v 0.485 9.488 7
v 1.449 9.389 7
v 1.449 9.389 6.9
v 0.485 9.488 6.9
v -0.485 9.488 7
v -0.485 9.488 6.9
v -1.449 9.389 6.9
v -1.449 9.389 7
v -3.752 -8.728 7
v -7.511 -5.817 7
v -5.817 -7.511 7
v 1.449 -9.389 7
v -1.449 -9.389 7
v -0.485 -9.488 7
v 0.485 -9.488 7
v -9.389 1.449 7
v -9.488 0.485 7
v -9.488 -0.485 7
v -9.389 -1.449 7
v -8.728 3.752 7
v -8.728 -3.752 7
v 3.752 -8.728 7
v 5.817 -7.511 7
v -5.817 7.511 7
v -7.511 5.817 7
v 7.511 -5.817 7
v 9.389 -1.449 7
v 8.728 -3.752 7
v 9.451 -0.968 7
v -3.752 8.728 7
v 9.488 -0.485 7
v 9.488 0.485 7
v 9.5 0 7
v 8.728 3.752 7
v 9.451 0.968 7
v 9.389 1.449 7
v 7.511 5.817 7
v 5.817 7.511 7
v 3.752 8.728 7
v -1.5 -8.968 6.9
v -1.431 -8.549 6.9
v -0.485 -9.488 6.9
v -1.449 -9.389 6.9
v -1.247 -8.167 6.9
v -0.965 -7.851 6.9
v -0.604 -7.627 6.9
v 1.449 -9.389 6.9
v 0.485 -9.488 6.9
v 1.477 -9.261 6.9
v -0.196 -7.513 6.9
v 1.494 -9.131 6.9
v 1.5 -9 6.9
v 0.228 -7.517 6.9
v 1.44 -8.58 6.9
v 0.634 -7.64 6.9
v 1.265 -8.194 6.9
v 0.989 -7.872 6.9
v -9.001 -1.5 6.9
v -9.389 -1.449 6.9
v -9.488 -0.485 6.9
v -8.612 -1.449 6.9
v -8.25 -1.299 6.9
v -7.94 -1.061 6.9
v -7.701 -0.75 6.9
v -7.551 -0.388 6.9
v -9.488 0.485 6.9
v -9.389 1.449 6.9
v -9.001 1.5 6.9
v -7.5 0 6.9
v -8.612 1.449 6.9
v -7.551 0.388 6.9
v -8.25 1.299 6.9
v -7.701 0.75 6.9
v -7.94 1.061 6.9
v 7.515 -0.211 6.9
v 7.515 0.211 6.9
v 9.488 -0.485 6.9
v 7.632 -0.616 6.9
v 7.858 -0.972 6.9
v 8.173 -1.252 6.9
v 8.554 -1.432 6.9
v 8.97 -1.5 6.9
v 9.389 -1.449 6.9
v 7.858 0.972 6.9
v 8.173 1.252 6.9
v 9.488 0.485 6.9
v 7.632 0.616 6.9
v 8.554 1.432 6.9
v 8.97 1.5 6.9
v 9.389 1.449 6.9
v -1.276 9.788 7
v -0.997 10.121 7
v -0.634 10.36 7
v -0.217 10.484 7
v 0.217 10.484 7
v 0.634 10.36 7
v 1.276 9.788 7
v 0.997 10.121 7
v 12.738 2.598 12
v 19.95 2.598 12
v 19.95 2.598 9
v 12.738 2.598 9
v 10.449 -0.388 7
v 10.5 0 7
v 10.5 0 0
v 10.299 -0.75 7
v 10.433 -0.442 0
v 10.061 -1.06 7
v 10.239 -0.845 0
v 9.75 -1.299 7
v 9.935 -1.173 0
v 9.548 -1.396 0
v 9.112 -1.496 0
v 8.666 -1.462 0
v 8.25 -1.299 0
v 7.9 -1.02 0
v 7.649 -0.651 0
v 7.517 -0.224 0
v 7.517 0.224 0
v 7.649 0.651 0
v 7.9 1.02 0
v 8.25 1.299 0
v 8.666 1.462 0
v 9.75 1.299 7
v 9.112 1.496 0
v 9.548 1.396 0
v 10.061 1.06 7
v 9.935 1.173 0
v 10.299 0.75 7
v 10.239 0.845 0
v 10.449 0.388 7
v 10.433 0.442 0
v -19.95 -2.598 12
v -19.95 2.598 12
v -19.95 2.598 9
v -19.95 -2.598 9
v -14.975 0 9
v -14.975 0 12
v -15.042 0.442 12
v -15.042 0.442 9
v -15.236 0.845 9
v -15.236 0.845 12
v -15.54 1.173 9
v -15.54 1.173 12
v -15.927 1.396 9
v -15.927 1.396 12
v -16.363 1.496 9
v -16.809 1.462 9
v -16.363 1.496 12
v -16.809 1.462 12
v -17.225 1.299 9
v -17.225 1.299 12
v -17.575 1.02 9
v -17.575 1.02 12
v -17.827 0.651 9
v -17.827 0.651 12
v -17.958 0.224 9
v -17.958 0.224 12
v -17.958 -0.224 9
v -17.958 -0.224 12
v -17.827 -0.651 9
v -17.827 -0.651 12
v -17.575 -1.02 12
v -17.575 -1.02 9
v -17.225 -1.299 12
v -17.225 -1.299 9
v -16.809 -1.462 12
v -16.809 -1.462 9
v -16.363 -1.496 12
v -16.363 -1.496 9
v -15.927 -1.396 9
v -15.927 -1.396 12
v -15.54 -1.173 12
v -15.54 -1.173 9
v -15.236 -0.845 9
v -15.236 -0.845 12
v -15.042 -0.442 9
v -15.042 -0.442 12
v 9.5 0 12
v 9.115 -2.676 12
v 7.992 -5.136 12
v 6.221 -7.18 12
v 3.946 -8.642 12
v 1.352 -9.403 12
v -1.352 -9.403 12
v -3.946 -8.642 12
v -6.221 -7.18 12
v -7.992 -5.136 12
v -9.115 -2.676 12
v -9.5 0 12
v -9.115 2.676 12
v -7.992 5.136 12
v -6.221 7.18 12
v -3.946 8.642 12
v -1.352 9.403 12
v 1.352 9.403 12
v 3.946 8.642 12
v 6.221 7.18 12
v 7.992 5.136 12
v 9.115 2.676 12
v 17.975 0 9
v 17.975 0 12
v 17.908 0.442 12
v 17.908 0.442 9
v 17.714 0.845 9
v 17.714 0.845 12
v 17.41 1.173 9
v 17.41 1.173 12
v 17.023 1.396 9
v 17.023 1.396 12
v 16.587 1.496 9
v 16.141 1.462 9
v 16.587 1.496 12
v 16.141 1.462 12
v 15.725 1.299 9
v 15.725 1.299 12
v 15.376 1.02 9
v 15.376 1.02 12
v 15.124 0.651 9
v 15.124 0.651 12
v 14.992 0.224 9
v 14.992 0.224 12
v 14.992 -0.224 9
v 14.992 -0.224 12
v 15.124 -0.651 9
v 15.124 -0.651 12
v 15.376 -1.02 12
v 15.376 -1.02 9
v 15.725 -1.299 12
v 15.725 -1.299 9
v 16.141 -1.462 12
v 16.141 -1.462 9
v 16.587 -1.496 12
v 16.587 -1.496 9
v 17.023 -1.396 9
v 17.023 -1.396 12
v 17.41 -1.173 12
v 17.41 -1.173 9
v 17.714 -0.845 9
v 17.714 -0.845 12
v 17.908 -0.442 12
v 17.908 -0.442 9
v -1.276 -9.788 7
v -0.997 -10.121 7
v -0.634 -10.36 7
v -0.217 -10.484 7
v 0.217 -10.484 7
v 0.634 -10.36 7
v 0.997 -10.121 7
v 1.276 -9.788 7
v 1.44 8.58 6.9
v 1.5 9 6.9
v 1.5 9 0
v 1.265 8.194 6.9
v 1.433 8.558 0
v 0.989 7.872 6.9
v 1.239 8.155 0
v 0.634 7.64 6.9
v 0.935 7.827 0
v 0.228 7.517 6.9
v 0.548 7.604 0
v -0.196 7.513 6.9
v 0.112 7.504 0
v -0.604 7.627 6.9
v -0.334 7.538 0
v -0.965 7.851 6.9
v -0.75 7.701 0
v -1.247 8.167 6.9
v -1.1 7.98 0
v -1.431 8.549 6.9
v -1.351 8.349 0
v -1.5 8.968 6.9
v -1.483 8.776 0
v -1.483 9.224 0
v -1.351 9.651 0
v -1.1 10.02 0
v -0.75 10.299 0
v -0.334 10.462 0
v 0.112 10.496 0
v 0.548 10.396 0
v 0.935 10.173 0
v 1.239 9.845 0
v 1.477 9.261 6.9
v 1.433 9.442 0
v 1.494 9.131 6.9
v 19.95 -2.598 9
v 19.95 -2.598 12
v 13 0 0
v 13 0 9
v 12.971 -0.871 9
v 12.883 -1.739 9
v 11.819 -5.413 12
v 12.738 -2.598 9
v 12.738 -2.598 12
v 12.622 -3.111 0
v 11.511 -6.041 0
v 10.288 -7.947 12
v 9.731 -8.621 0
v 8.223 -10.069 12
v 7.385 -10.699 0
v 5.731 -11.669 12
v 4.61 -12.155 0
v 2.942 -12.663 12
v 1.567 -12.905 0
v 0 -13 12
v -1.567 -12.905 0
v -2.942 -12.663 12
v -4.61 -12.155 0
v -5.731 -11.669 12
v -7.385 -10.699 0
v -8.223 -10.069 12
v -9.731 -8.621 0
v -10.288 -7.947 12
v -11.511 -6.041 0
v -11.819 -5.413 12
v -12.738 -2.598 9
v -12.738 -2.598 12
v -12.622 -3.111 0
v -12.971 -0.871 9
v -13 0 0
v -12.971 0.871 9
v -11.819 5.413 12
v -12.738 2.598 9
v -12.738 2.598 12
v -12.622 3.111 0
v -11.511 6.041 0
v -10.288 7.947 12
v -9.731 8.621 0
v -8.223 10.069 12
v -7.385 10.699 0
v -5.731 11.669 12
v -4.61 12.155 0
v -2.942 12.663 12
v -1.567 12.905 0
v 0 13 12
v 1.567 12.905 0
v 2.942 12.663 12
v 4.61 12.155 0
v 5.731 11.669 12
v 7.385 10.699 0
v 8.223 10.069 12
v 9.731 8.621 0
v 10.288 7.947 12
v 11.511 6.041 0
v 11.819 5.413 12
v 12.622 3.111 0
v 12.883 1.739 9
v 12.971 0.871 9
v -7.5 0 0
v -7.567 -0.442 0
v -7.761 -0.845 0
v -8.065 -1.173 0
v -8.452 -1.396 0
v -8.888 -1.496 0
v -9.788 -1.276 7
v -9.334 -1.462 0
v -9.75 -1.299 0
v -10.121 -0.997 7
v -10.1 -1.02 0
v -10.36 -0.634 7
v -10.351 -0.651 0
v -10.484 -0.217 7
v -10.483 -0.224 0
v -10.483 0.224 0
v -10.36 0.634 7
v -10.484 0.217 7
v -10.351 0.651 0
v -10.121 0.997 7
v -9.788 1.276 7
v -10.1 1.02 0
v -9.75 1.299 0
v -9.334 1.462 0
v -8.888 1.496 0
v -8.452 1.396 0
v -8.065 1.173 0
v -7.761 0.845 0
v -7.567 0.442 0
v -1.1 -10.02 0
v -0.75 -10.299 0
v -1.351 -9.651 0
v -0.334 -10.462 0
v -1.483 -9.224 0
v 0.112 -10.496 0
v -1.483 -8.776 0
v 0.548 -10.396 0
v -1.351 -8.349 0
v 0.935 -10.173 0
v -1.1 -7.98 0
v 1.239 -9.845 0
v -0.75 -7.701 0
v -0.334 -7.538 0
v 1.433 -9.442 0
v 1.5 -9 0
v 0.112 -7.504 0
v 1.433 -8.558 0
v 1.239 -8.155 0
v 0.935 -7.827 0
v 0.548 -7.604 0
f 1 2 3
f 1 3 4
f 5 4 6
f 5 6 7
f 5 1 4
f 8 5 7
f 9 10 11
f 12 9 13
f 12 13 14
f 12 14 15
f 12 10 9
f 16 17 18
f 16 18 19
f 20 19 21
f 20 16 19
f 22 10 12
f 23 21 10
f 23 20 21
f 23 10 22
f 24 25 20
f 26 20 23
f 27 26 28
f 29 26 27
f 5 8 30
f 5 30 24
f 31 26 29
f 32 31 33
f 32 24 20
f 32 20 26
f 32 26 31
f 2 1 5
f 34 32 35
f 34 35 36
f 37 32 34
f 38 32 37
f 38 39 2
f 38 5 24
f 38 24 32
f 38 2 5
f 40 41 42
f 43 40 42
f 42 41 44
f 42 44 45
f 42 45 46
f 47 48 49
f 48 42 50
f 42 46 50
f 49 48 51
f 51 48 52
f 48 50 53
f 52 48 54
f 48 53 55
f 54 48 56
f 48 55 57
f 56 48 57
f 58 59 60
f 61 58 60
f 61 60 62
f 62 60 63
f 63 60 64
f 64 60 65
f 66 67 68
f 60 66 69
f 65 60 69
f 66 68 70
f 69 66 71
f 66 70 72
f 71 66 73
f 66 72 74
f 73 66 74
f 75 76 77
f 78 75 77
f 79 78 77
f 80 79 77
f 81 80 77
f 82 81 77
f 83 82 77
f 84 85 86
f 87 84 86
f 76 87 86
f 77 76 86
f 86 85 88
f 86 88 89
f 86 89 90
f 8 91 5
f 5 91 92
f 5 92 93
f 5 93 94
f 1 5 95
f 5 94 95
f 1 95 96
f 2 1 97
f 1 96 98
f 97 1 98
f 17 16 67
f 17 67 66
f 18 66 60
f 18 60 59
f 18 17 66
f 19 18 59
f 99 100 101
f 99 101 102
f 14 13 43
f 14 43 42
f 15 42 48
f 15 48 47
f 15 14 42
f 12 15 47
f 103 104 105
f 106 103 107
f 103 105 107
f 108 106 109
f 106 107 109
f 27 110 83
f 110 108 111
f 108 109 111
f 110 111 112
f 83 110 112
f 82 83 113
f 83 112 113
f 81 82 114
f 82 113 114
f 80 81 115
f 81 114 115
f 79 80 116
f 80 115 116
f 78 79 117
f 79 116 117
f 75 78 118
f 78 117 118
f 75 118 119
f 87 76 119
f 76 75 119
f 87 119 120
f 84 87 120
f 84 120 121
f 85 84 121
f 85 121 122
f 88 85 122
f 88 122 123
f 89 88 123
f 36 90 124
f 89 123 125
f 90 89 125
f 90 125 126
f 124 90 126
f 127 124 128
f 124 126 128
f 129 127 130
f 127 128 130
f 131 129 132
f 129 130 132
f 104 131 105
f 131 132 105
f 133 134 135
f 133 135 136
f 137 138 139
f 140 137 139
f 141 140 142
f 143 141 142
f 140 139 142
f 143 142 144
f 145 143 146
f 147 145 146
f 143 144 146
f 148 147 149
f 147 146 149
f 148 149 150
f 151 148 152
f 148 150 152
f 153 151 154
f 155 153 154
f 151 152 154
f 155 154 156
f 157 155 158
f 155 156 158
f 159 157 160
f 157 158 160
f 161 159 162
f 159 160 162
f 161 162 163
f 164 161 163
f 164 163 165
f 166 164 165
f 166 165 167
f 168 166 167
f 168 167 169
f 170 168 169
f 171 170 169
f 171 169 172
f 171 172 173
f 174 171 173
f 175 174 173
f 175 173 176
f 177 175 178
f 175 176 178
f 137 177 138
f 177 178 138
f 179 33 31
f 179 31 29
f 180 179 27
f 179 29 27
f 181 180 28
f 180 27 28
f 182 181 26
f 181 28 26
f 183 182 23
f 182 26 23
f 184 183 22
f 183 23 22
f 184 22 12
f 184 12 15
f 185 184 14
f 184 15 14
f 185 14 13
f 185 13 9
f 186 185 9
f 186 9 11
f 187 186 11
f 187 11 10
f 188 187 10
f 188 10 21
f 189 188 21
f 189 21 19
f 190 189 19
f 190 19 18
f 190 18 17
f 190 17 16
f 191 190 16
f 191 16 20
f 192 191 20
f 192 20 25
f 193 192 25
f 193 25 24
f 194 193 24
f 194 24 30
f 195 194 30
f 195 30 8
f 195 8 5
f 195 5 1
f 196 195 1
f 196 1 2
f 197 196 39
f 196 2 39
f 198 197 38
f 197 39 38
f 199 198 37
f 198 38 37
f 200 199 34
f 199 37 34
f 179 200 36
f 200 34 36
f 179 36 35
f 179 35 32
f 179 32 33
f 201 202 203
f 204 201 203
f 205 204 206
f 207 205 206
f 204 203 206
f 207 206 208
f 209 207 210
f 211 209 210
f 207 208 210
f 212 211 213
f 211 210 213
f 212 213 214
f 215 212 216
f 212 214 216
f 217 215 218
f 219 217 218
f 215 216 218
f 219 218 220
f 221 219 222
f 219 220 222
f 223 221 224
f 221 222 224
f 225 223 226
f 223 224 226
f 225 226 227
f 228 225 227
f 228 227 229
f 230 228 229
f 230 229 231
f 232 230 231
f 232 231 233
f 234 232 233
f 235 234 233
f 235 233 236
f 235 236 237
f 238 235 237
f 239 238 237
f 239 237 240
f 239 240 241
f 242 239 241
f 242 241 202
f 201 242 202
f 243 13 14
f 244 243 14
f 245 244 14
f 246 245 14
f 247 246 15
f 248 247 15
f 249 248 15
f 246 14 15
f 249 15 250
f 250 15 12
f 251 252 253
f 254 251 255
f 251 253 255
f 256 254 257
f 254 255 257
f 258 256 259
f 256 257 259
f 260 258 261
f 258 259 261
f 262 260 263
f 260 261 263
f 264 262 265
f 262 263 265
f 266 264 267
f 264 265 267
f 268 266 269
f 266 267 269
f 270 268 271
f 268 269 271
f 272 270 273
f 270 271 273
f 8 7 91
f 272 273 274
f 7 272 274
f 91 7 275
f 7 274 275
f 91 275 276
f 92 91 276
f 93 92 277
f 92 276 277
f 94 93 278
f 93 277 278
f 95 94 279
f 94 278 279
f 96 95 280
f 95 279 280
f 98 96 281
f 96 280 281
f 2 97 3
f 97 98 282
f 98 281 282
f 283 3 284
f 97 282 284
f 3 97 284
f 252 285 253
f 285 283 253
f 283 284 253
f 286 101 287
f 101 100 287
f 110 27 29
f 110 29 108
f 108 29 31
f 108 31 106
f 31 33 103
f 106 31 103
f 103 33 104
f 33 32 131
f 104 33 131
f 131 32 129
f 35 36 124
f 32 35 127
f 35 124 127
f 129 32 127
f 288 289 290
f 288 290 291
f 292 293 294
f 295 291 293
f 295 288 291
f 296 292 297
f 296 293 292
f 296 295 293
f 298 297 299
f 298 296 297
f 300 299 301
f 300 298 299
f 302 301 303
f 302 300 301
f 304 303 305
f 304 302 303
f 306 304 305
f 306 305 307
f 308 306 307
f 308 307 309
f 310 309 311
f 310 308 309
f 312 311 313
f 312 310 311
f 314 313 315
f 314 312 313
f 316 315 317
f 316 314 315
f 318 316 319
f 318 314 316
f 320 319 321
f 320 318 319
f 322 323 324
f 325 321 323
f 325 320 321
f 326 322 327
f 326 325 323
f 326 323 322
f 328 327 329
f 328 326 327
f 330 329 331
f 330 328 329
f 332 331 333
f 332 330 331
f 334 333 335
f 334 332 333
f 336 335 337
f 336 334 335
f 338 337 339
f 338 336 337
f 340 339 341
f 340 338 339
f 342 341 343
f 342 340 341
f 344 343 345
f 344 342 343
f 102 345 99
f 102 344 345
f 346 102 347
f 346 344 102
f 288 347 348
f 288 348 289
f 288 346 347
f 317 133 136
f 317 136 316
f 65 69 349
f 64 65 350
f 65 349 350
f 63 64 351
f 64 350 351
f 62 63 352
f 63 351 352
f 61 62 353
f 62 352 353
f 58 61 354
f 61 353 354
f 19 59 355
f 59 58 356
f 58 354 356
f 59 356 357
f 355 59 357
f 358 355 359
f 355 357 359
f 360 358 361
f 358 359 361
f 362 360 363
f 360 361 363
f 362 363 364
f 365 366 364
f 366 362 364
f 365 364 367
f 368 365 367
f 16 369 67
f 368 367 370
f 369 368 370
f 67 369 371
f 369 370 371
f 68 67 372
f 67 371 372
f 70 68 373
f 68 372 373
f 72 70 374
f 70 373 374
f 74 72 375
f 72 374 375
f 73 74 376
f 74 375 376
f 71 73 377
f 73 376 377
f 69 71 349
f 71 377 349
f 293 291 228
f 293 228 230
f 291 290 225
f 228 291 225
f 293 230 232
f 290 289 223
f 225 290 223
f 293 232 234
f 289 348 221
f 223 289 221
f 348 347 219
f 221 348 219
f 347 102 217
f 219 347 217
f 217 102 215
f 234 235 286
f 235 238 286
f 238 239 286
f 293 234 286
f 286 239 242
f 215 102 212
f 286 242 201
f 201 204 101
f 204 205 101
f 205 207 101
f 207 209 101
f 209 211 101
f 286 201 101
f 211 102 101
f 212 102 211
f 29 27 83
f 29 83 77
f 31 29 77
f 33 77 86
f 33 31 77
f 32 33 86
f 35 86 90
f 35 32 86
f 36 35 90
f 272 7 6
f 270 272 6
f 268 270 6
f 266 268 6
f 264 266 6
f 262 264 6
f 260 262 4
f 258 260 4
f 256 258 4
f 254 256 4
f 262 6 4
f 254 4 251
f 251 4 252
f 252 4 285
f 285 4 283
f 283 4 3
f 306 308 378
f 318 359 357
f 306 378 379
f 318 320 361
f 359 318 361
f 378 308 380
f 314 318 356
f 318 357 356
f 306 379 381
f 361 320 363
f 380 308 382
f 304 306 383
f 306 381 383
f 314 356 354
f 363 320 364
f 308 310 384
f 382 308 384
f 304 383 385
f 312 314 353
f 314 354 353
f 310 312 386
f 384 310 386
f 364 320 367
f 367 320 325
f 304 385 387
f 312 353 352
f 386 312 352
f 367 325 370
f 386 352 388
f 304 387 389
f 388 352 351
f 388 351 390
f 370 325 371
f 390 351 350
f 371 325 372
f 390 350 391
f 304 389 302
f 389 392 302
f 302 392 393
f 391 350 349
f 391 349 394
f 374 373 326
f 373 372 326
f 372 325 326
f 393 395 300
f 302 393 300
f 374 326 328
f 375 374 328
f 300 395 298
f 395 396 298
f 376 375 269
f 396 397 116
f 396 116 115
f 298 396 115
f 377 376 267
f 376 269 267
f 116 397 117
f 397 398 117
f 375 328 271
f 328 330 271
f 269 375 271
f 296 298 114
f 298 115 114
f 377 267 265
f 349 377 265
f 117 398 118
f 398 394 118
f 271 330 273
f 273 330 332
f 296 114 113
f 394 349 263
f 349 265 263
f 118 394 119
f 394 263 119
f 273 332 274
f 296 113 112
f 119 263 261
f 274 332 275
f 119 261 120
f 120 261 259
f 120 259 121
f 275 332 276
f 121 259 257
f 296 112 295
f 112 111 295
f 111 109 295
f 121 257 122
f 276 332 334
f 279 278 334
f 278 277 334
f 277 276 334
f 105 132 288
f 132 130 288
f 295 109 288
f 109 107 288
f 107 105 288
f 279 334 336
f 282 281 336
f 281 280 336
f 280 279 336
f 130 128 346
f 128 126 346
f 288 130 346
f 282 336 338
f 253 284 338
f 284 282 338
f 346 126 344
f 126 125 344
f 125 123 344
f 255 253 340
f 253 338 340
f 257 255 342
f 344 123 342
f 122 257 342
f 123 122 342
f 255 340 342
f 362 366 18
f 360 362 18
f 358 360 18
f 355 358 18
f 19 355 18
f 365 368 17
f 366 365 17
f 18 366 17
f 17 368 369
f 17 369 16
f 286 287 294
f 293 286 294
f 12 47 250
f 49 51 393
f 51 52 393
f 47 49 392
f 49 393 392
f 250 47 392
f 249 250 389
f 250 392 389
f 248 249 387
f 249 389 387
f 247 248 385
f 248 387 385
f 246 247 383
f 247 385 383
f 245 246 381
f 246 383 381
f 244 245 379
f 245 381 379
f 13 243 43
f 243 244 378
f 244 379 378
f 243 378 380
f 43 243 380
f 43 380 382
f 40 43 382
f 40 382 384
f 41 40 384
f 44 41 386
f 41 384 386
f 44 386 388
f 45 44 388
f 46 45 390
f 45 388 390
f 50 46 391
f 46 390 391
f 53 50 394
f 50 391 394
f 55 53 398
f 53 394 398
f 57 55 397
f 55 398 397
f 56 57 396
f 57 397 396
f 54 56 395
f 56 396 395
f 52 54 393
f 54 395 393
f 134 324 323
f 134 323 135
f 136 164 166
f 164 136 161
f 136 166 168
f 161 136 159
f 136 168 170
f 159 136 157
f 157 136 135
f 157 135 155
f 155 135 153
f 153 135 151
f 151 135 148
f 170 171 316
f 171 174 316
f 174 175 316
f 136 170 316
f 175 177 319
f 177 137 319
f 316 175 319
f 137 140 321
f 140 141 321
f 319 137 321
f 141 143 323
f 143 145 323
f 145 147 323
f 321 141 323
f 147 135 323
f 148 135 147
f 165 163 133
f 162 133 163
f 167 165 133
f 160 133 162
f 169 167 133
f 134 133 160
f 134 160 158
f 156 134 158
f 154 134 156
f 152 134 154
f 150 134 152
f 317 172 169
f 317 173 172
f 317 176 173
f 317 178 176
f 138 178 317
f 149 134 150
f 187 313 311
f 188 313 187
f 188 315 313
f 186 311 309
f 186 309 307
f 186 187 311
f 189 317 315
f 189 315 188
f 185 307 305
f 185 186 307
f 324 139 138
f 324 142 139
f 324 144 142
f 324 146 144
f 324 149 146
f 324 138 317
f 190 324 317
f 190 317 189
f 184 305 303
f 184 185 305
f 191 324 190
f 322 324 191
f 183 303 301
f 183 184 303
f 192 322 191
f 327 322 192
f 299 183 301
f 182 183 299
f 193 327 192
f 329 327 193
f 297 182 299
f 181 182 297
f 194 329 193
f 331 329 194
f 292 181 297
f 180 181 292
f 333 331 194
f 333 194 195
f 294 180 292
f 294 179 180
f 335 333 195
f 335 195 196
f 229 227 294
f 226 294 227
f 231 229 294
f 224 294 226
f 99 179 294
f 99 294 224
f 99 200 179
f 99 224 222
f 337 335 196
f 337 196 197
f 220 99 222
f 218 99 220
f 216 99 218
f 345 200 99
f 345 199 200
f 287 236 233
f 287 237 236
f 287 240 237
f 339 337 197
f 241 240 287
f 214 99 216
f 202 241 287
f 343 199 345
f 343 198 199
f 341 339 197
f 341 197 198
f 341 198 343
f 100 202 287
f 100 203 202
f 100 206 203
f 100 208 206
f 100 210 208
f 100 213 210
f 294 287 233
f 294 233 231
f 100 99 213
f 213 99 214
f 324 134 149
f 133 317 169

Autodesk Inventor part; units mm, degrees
ref_plane "YZ Plane" through (0, 0, 0) normal (1, 0, 0) x (0, 1, 0)
ref_plane "XZ Plane" through (0, 0, 0) normal (0, 1, 0) x (-1, 0, 0)
ref_plane "XY Plane" through (0, 0, 0) normal (0, 0, 1) x (1, 0, 0)
sketch "Эскиз1" plane through (0, 0, 0) normal (0, 0, 1) x (1, 0, 0)
  circle A0 centre (0, 0) radius 13
  circle A1 centre (0, 9) radius 1.5
  circle A2 centre (-9, 0) radius 1.5
  circle A3 centre (0, -9) radius 1.5
  circle A4 centre (9, 0) radius 1.5
  dimension "d0" = 26
  dimension "d1" = 3
  dimension "d2" = 9
  dimension "d5" = 360
extrude "Выдавливание1" add sketch "Эскиз1" along normal blind 7
sketch "Эскиз2" plane through (0, 0, 7) normal (0, 0, 1) x (1, 0, 0)
  circle A0 centre (0, 0) radius 13 projected
  circle A1 centre (9, 0) radius 1.5 projected
  circle A2 centre (0, -9) radius 1.5 projected
  circle A3 centre (-9, 0) radius 1.5 projected
  circle A4 centre (0, 9) radius 1.5 projected
  circle A5 centre (0, 0) radius 9.5
  dimension "d9" = 19
extrude "Выдавливание2" add sketch "Эскиз2" along normal blind 5 contours A0 | A1 A5 | A5 A4 | A2 A5 | A5 A3 picked at (9.8174, -0.2697) picked at (-0.0593, 9.8216) picked at (0.0593, -9.8216) picked at (-9.8216, 0.0593)
sketch "Эскиз3" plane through (0, 0, 7) normal (0, 0, 1) x (1, 0, 0)
  arc A0 (-1.4487, 9.3889) -> (-9.3889, 1.4487) centre (0, 0) ccw projected
  arc A1 (-9.3889, -1.4487) -> (-9.3889, 1.4487) centre (-9, 0) ccw projected
  arc A2 (-9.3889, -1.4487) -> (-1.4487, -9.3889) centre (0, 0) ccw projected
  arc A3 (1.4487, -9.3889) -> (-1.4487, -9.3889) centre (0, -9) ccw projected
  arc A4 (1.4487, -9.3889) -> (9.3889, -1.4487) centre (0, 0) ccw projected
  arc A5 (9.3889, 1.4487) -> (9.3889, -1.4487) centre (9, 0) ccw projected
  arc A6 (9.3889, 1.4487) -> (1.4487, 9.3889) centre (0, 0) ccw projected
  arc A7 (-1.4487, 9.3889) -> (1.4487, 9.3889) centre (0, 9) ccw projected
  arc A8 (1.4487, 9.3889) -> (-1.4487, 9.3889) centre (0, 0) ccw projected
  circle A9 centre (0, 0) radius 9.5 projected
  arc A10 (9.3889, -1.4487) -> (9.3889, 1.4487) centre (0, 0) ccw projected
  arc A11 (1.4487, -9.3889) -> (9.3889, -1.4487) centre (0, 0) ccw projected
  arc A12 (-1.4487, -9.3889) -> (1.4487, -9.3889) centre (0, 0) ccw projected
  arc A13 (-9.3889, -1.4487) -> (-1.4487, -9.3889) centre (0, 0) ccw projected
  arc A14 (-9.3889, 1.4487) -> (-9.3889, -1.4487) centre (0, 0) ccw projected
  arc A15 (-1.4487, 9.3889) -> (-9.3889, 1.4487) centre (0, 0) ccw projected
  arc A16 (1.4487, 9.3889) -> (-1.4487, 9.3889) centre (0, 0) ccw projected
  arc A17 (9.3889, 1.4487) -> (1.4487, 9.3889) centre (0, 0) ccw projected
  point P0 (-1.4487, -9.3889)
  point P1 (1.4487, -9.3889)
  point P2 (9.3889, -1.4487)
  point P3 (9.3889, 1.4487)
  point P4 (-9.3889, 1.4487)
  point P5 (-9.3889, -1.4487)
extrude "Выдавливание3" add sketch "Эскиз3" against normal blind 0.1 contours A8 A7 | A1 A9 | A9 A5 | A3 A9
sketch "Эскиз4" plane through (0, 0, 12) normal (0, 0, 1) x (1, 0, 0)
  circle A0 centre (-16.4751, 0) radius 1.5
  circle A1 centre (0, 9) radius 1.5 projected
  arc A2 (1.4487, -9.3889) -> (-1.4487, -9.3889) centre (0, -9) ccw projected
  line L0 (0, 9) -> (0, -9)
  circle A3 centre (16.4751, 0) radius 1.5
  line L1 (-19.9502, -2.5984) -> (-13, -2.5984)
  line L2 (-13, -2.5984) -> (-13, 2.5984)
  line L3 (-13, 2.5984) -> (-19.9502, 2.5984)
  line L4 (-19.9502, 2.5984) -> (-19.9502, -2.5984)
  line L5 (-19.9502, -2.5984) -> (-13, 2.5984) construction
  line L6 (-13, -2.5984) -> (-19.9502, 2.5984) construction
  line L7 (-13, 2.5984) -> (-11.6906, 2.5984)
  circle A4 centre (0, 0) radius 13 projected
  circle A5 centre (0, 0) radius 9.5 projected
  line L8 (-13, -2.5984) -> (-12.3453, -2.5984)
  circle A6 centre (16.4751, 0) radius 1.5
  line L9 (19.9502, -2.5984) -> (13, -2.5984)
  line L10 (13, -2.5984) -> (13, 2.5984)
  line L11 (13, 2.5984) -> (19.9502, 2.5984)
  line L12 (19.9502, 2.5984) -> (19.9502, -2.5984)
  line L13 (19.9502, -2.5984) -> (13, 2.5984) construction
  line L14 (13, -2.5984) -> (19.9502, 2.5984) construction
  line L15 (13, 2.5984) -> (11.6906, 2.5984)
  line L16 (13, -2.5984) -> (12.3453, -2.5984)
  point P0 (12.7377, 2.5984)
  point P1 (12.7377, -2.5984)
  point P2 (-12.7377, -2.5984)
  point P3 (-12.7377, 2.5984)
  dimension "d14" = 3
extrude "Выдавливание4" add sketch "Эскиз4" against normal blind 3 contours L4 L3 L2 L1 | L2 A4 L8 | L2 L7 A4 | A4 L10 L16 | L15 L10 A4 | L10 L11 L12 L9
properties part number "вт2"
